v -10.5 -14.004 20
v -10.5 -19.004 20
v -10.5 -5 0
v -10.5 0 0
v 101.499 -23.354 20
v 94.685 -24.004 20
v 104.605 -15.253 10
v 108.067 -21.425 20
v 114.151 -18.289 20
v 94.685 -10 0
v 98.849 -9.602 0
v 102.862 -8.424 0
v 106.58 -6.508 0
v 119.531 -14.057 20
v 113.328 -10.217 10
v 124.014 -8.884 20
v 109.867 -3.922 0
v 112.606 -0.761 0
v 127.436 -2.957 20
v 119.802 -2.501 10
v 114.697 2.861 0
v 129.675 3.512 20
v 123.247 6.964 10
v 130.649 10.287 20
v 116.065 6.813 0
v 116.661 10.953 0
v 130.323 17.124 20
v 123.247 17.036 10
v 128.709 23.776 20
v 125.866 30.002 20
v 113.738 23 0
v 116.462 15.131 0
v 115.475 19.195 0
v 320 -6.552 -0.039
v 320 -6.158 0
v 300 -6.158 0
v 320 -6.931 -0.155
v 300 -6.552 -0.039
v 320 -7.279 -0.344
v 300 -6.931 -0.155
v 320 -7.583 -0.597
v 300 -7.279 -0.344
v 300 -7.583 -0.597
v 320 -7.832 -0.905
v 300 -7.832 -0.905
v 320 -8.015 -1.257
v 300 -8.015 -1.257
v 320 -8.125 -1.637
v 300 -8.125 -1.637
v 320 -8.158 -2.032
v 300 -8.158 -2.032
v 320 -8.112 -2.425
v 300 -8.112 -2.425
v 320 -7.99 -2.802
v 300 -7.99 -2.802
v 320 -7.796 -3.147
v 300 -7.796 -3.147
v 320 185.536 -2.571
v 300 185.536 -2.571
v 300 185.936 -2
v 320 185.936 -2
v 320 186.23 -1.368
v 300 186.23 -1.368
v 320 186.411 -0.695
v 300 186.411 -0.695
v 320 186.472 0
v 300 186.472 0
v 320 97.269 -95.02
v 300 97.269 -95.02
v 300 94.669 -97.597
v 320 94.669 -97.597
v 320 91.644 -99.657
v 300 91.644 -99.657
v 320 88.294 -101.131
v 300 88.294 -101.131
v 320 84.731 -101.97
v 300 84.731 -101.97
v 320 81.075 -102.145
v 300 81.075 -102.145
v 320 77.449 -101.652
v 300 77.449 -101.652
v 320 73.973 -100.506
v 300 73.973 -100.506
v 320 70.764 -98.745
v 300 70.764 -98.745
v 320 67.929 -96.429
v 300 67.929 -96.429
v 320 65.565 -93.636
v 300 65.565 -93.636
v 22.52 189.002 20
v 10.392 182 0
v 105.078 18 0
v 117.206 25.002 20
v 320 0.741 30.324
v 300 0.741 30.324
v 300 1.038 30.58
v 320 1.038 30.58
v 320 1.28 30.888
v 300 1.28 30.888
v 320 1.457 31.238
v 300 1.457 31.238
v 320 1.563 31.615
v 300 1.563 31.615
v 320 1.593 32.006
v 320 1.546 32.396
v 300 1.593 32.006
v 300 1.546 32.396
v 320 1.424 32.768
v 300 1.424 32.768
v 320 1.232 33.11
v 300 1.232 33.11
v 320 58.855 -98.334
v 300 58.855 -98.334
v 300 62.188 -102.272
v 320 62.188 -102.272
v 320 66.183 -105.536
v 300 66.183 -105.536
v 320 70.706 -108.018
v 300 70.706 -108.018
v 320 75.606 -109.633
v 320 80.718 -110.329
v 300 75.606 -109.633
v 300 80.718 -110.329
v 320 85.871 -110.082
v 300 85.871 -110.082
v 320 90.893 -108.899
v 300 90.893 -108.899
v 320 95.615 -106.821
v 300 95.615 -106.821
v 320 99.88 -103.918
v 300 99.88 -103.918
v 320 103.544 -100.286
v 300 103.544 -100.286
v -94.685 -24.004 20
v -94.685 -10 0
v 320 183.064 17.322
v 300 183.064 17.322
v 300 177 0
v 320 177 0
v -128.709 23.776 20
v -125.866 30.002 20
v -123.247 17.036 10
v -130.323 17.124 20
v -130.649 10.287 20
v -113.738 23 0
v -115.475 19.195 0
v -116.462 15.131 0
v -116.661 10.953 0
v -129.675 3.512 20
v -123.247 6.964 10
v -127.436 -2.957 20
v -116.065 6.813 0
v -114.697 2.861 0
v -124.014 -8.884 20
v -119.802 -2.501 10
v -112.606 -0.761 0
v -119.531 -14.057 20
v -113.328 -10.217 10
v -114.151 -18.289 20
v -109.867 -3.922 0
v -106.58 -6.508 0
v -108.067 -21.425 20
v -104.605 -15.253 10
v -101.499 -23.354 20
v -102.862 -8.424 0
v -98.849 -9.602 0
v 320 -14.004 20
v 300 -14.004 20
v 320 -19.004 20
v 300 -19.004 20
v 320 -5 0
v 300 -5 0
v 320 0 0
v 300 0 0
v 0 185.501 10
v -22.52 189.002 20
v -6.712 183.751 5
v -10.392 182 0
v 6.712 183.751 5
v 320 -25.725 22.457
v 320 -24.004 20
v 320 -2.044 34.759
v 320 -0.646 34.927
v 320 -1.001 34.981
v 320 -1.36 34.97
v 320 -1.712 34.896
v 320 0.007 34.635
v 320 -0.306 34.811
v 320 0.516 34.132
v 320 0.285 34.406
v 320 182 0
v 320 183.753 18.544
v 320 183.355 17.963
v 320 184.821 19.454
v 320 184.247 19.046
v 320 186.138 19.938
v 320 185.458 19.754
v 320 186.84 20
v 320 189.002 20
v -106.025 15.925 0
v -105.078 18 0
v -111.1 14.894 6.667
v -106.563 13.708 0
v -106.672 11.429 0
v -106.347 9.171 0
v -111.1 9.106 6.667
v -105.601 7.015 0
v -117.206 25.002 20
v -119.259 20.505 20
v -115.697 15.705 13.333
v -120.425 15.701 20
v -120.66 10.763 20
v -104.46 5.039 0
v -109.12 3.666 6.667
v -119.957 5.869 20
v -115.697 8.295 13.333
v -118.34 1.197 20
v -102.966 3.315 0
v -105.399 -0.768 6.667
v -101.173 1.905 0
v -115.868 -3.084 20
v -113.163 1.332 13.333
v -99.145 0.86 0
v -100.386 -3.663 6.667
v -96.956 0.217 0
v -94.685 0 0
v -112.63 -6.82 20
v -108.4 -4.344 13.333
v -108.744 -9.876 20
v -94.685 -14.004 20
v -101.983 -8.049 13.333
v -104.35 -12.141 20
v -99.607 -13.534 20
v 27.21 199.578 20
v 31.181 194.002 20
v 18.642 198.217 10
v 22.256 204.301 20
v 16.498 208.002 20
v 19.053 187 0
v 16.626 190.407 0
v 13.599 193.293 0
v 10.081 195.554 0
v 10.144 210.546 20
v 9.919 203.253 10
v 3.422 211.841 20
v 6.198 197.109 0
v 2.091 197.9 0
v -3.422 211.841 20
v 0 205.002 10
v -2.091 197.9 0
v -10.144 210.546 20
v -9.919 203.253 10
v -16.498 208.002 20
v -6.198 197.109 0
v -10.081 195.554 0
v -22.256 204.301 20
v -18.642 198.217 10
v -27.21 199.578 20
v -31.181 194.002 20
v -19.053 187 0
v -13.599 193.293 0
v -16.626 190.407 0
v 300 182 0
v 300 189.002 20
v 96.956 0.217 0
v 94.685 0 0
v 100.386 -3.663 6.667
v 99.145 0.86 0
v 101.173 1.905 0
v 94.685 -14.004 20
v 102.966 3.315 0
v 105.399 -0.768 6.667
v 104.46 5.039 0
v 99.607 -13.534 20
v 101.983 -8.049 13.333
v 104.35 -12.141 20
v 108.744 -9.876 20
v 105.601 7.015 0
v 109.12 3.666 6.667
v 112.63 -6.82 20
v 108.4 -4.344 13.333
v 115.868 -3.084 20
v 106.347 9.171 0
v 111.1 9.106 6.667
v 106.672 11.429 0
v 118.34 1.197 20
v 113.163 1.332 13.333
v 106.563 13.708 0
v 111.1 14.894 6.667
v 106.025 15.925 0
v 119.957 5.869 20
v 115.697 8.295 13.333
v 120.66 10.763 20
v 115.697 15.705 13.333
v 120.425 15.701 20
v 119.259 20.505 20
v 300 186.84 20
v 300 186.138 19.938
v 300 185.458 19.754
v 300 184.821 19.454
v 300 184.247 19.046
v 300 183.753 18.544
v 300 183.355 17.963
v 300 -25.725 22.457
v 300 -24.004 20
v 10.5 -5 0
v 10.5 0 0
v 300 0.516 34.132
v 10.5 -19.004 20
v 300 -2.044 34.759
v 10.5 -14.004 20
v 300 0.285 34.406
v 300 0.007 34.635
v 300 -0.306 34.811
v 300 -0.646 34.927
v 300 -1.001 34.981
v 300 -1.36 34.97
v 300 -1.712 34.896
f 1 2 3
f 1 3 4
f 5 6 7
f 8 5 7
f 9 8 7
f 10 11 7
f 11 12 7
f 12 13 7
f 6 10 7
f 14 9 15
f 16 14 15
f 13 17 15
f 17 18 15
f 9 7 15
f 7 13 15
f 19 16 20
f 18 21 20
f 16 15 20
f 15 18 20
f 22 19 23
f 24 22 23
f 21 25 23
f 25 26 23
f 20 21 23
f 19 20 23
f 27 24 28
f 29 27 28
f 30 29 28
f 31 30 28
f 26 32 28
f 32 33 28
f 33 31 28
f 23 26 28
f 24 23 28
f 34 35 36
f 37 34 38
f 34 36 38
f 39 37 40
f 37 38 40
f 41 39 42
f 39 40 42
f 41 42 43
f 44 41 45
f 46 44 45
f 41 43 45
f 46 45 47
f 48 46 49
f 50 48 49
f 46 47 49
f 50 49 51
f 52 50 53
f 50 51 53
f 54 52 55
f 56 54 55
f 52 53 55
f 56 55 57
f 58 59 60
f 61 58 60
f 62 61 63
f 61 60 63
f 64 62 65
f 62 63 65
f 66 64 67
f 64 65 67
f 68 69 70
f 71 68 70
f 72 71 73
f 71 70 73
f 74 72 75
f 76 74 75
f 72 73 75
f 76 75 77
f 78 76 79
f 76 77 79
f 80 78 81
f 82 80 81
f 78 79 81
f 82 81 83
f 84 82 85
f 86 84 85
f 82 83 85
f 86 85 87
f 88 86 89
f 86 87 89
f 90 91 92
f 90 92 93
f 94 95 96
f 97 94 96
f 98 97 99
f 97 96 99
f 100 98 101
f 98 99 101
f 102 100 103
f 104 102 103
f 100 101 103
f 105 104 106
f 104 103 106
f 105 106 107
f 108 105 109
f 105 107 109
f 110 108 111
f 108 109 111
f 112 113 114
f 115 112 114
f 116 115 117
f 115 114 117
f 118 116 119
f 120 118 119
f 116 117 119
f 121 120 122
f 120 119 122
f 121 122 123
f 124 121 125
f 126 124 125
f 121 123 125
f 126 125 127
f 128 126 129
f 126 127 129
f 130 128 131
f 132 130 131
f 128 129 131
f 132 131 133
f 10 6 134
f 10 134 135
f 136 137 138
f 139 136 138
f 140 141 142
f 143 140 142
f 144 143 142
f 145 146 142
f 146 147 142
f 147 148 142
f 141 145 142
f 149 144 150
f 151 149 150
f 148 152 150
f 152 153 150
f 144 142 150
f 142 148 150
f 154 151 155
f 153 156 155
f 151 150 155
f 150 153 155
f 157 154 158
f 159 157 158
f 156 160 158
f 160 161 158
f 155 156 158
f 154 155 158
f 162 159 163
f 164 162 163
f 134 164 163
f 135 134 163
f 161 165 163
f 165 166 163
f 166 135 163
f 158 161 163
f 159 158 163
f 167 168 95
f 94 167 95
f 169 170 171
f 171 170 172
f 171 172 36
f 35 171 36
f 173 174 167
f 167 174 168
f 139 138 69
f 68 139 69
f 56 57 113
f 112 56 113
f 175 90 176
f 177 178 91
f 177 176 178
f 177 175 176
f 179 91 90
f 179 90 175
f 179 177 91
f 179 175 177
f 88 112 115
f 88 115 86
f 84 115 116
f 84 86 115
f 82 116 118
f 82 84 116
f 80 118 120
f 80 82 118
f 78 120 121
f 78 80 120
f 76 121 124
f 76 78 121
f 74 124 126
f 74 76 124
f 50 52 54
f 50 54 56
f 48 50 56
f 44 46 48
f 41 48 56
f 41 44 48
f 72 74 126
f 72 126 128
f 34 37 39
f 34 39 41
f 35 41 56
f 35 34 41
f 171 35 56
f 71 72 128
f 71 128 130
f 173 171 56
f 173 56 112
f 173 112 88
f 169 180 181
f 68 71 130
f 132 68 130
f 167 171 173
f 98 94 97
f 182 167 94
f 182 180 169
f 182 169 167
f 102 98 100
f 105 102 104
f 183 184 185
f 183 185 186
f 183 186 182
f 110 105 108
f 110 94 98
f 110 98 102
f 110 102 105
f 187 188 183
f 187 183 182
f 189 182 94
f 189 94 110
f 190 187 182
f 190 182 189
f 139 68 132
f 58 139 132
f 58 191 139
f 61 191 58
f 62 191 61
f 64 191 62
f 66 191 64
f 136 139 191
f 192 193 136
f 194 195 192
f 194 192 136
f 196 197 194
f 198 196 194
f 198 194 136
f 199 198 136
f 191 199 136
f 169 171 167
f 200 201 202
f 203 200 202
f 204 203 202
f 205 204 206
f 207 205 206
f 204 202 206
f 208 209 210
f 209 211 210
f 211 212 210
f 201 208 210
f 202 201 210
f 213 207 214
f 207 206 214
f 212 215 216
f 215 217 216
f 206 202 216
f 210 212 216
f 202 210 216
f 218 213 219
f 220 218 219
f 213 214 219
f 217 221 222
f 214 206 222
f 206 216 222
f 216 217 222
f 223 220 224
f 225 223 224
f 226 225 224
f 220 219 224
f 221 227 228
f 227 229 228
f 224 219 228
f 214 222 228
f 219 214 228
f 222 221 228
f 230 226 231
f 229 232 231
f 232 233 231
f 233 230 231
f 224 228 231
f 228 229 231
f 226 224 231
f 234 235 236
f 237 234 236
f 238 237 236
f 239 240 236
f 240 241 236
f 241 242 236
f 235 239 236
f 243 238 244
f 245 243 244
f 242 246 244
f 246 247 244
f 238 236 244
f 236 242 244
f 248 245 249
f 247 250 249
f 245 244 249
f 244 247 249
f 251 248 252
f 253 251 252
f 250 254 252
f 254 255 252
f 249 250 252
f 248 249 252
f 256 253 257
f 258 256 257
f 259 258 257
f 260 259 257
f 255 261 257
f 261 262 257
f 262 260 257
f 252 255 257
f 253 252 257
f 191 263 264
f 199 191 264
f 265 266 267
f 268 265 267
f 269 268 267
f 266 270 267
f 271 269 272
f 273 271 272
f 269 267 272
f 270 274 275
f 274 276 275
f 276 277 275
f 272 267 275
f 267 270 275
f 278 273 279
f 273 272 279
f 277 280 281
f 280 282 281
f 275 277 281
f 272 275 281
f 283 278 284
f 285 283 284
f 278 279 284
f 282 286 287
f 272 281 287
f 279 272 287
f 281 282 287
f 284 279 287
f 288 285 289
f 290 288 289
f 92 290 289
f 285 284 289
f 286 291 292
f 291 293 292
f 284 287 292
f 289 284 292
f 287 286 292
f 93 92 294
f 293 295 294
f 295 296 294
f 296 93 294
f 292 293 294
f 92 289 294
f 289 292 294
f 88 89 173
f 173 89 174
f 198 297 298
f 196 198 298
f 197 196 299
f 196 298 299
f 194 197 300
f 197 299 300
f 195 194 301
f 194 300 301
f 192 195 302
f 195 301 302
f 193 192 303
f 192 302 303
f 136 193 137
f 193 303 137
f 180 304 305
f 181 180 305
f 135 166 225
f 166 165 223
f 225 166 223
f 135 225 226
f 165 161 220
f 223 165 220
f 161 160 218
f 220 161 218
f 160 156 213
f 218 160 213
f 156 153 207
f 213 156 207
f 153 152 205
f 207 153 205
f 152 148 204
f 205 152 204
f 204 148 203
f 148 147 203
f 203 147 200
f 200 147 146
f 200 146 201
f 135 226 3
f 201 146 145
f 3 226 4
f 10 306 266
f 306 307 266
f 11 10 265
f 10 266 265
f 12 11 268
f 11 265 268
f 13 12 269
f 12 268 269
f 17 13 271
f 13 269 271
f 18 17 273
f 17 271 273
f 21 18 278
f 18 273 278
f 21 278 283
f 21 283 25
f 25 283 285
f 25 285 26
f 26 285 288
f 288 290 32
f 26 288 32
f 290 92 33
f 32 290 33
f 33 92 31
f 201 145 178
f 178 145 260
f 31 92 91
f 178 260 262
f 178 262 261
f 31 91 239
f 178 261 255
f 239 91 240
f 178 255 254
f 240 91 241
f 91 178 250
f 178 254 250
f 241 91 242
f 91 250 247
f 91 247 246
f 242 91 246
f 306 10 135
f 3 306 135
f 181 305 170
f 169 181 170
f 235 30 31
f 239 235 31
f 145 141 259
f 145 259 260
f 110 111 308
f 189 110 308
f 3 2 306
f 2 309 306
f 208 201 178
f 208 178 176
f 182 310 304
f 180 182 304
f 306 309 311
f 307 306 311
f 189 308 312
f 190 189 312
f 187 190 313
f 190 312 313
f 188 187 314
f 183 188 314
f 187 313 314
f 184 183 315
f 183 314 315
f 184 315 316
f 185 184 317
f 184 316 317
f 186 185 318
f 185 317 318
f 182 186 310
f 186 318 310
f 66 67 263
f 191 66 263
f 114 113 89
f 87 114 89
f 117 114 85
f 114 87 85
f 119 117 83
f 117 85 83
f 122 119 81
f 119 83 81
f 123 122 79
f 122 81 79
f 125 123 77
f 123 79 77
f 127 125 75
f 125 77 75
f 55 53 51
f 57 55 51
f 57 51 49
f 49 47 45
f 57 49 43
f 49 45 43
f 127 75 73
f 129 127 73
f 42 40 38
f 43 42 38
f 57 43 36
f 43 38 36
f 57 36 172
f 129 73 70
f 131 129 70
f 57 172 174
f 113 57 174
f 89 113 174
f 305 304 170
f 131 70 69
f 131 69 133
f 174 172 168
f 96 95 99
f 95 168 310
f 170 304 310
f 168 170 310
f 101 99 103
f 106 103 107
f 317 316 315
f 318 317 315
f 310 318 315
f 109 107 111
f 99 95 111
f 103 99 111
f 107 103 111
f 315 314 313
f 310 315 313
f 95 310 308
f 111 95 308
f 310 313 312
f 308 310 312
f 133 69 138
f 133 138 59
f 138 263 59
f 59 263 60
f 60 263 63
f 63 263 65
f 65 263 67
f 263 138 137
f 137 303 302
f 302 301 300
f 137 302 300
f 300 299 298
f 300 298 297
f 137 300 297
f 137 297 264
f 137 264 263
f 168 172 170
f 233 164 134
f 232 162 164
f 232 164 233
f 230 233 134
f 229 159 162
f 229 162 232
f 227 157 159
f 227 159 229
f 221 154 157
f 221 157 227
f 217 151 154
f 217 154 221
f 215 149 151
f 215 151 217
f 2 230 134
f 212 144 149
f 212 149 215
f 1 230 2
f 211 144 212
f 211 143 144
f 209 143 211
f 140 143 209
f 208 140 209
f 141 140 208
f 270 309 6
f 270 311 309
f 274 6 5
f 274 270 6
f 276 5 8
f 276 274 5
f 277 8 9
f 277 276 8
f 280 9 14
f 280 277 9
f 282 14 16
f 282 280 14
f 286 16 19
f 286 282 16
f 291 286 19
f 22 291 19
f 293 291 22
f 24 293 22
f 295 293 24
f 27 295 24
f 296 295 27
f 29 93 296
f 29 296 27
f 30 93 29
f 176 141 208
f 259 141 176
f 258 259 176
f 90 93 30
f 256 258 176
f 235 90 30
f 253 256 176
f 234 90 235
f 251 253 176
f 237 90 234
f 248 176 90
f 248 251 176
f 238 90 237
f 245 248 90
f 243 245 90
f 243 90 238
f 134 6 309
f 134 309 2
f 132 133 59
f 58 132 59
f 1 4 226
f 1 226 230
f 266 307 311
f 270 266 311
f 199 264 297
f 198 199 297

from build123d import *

# Parameters (mm, degrees)
F7_DEPTH = 20
F9_DEPTH = 10.5


with BuildPart() as f2:
    # F2: sweep along a path in F0
    with BuildLine(Plane.XY) as f2_path:
        Line((-94.685444, 0), (94.685444, 0))
        ThreePointArc((94.685444, 0), (105.077749, 6), (105.077749, 18))
        Line((105.077749, 18), (10.392305, 182))
        ThreePointArc((10.392305, 182), (0, 188), (-10.392305, 182))
        Line((-10.392305, 182), (-105.077749, 18))
        ThreePointArc((-105.077749, 18), (-105.077749, 6), (-94.685444, 0))
    # F1 (on Right) → F2 (sweep)
    with BuildSketch(Plane.YZ):
        Polygon((-10, 0), (0, 0), (-14.004151, 20), (-24.004151, 20), align=None)
    sweep(path=f2_path.line)

    # F0 (on Top) → F4 section 0
    with BuildSketch(Plane.XY):
        with BuildLine():
            ThreePointArc((10.392305, 182), (0, 188), (-10.392305, 182))
            Line((-10.392305, 182), (10.392305, 182))
        make_face()
    # F3 (on face) → F4 section 1
    with BuildSketch(Plane.XY.offset(20)):
        with BuildLine():
            Line((-22.520255, 189.002075), (22.520255, 189.002075))
            ThreePointArc((22.520255, 189.002075), (0, 202.004151), (-22.520255, 189.002075))
        make_face()
    loft()

    # F8 (on Right) → F9 (cut, symmetric)
    with BuildSketch(Plane.YZ):
        Polygon((-19.004151, 20), (-5, 0), (5, 0), (-9.004151, 20), align=None)
    extrude(amount=F9_DEPTH, both=True, mode=Mode.SUBTRACT)


with BuildPart() as f7:
    # F6 (on offset) → F7 (new body)
    with BuildSketch(Plane.YZ.offset(300)):
        with BuildLine():
            Line((186.471641, 0), (182, 0))
            Line((182, 0), (189.002075, 20))
            Line((189.002075, 20), (186.839721, 20))
            ThreePointArc((186.839721, 20), (184.52531, 19.262438), (183.06441, 17.321751))
            Line((183.06441, 17.321751), (177, 0))
            Line((177, 0), (97.268564, -95.020225))
            ThreePointArc((97.268564, -95.020225), (81.075287, -102.145437), (65.564634, -93.636002))
            Line((65.564634, -93.636002), (0, 0))
            Line((0, 0), (-14.004151, 20))
            Line((-14.004151, 20), (0.740586, 30.324376))
            ThreePointArc((0.740586, 30.324376), (1.563049, 31.615384), (1.231737, 33.109833))
            Line((1.231737, 33.109833), (0.516175, 34.131761))
            ThreePointArc((0.516175, 34.131761), (-0.645935, 34.927091), (-2.044124, 34.759411))
            Line((-2.044124, 34.759411), (-25.72488, 22.457456))
            Line((-25.72488, 22.457456), (-24.004151, 20))
            Line((-24.004151, 20), (-19.004151, 20))
            Line((-19.004151, 20), (-5, 0))
            Line((-5, 0), (-6.158036, 0))
            ThreePointArc((-6.158036, 0), (-7.932057, -1.076503), (-7.79634, -3.147153))
            Line((-7.79634, -3.147153), (58.854534, -98.334465))
            ThreePointArc((58.854534, -98.334465), (80.717978, -110.329161), (103.543633, -100.285633))
            Line((103.543633, -100.285633), (185.535819, -2.57115))
            ThreePointArc((185.535819, -2.57115), (186.230412, -1.368081), (186.471641, 0))
        make_face()
    extrude(amount=F7_DEPTH)


solid = Compound([f2.part, f7.part])
